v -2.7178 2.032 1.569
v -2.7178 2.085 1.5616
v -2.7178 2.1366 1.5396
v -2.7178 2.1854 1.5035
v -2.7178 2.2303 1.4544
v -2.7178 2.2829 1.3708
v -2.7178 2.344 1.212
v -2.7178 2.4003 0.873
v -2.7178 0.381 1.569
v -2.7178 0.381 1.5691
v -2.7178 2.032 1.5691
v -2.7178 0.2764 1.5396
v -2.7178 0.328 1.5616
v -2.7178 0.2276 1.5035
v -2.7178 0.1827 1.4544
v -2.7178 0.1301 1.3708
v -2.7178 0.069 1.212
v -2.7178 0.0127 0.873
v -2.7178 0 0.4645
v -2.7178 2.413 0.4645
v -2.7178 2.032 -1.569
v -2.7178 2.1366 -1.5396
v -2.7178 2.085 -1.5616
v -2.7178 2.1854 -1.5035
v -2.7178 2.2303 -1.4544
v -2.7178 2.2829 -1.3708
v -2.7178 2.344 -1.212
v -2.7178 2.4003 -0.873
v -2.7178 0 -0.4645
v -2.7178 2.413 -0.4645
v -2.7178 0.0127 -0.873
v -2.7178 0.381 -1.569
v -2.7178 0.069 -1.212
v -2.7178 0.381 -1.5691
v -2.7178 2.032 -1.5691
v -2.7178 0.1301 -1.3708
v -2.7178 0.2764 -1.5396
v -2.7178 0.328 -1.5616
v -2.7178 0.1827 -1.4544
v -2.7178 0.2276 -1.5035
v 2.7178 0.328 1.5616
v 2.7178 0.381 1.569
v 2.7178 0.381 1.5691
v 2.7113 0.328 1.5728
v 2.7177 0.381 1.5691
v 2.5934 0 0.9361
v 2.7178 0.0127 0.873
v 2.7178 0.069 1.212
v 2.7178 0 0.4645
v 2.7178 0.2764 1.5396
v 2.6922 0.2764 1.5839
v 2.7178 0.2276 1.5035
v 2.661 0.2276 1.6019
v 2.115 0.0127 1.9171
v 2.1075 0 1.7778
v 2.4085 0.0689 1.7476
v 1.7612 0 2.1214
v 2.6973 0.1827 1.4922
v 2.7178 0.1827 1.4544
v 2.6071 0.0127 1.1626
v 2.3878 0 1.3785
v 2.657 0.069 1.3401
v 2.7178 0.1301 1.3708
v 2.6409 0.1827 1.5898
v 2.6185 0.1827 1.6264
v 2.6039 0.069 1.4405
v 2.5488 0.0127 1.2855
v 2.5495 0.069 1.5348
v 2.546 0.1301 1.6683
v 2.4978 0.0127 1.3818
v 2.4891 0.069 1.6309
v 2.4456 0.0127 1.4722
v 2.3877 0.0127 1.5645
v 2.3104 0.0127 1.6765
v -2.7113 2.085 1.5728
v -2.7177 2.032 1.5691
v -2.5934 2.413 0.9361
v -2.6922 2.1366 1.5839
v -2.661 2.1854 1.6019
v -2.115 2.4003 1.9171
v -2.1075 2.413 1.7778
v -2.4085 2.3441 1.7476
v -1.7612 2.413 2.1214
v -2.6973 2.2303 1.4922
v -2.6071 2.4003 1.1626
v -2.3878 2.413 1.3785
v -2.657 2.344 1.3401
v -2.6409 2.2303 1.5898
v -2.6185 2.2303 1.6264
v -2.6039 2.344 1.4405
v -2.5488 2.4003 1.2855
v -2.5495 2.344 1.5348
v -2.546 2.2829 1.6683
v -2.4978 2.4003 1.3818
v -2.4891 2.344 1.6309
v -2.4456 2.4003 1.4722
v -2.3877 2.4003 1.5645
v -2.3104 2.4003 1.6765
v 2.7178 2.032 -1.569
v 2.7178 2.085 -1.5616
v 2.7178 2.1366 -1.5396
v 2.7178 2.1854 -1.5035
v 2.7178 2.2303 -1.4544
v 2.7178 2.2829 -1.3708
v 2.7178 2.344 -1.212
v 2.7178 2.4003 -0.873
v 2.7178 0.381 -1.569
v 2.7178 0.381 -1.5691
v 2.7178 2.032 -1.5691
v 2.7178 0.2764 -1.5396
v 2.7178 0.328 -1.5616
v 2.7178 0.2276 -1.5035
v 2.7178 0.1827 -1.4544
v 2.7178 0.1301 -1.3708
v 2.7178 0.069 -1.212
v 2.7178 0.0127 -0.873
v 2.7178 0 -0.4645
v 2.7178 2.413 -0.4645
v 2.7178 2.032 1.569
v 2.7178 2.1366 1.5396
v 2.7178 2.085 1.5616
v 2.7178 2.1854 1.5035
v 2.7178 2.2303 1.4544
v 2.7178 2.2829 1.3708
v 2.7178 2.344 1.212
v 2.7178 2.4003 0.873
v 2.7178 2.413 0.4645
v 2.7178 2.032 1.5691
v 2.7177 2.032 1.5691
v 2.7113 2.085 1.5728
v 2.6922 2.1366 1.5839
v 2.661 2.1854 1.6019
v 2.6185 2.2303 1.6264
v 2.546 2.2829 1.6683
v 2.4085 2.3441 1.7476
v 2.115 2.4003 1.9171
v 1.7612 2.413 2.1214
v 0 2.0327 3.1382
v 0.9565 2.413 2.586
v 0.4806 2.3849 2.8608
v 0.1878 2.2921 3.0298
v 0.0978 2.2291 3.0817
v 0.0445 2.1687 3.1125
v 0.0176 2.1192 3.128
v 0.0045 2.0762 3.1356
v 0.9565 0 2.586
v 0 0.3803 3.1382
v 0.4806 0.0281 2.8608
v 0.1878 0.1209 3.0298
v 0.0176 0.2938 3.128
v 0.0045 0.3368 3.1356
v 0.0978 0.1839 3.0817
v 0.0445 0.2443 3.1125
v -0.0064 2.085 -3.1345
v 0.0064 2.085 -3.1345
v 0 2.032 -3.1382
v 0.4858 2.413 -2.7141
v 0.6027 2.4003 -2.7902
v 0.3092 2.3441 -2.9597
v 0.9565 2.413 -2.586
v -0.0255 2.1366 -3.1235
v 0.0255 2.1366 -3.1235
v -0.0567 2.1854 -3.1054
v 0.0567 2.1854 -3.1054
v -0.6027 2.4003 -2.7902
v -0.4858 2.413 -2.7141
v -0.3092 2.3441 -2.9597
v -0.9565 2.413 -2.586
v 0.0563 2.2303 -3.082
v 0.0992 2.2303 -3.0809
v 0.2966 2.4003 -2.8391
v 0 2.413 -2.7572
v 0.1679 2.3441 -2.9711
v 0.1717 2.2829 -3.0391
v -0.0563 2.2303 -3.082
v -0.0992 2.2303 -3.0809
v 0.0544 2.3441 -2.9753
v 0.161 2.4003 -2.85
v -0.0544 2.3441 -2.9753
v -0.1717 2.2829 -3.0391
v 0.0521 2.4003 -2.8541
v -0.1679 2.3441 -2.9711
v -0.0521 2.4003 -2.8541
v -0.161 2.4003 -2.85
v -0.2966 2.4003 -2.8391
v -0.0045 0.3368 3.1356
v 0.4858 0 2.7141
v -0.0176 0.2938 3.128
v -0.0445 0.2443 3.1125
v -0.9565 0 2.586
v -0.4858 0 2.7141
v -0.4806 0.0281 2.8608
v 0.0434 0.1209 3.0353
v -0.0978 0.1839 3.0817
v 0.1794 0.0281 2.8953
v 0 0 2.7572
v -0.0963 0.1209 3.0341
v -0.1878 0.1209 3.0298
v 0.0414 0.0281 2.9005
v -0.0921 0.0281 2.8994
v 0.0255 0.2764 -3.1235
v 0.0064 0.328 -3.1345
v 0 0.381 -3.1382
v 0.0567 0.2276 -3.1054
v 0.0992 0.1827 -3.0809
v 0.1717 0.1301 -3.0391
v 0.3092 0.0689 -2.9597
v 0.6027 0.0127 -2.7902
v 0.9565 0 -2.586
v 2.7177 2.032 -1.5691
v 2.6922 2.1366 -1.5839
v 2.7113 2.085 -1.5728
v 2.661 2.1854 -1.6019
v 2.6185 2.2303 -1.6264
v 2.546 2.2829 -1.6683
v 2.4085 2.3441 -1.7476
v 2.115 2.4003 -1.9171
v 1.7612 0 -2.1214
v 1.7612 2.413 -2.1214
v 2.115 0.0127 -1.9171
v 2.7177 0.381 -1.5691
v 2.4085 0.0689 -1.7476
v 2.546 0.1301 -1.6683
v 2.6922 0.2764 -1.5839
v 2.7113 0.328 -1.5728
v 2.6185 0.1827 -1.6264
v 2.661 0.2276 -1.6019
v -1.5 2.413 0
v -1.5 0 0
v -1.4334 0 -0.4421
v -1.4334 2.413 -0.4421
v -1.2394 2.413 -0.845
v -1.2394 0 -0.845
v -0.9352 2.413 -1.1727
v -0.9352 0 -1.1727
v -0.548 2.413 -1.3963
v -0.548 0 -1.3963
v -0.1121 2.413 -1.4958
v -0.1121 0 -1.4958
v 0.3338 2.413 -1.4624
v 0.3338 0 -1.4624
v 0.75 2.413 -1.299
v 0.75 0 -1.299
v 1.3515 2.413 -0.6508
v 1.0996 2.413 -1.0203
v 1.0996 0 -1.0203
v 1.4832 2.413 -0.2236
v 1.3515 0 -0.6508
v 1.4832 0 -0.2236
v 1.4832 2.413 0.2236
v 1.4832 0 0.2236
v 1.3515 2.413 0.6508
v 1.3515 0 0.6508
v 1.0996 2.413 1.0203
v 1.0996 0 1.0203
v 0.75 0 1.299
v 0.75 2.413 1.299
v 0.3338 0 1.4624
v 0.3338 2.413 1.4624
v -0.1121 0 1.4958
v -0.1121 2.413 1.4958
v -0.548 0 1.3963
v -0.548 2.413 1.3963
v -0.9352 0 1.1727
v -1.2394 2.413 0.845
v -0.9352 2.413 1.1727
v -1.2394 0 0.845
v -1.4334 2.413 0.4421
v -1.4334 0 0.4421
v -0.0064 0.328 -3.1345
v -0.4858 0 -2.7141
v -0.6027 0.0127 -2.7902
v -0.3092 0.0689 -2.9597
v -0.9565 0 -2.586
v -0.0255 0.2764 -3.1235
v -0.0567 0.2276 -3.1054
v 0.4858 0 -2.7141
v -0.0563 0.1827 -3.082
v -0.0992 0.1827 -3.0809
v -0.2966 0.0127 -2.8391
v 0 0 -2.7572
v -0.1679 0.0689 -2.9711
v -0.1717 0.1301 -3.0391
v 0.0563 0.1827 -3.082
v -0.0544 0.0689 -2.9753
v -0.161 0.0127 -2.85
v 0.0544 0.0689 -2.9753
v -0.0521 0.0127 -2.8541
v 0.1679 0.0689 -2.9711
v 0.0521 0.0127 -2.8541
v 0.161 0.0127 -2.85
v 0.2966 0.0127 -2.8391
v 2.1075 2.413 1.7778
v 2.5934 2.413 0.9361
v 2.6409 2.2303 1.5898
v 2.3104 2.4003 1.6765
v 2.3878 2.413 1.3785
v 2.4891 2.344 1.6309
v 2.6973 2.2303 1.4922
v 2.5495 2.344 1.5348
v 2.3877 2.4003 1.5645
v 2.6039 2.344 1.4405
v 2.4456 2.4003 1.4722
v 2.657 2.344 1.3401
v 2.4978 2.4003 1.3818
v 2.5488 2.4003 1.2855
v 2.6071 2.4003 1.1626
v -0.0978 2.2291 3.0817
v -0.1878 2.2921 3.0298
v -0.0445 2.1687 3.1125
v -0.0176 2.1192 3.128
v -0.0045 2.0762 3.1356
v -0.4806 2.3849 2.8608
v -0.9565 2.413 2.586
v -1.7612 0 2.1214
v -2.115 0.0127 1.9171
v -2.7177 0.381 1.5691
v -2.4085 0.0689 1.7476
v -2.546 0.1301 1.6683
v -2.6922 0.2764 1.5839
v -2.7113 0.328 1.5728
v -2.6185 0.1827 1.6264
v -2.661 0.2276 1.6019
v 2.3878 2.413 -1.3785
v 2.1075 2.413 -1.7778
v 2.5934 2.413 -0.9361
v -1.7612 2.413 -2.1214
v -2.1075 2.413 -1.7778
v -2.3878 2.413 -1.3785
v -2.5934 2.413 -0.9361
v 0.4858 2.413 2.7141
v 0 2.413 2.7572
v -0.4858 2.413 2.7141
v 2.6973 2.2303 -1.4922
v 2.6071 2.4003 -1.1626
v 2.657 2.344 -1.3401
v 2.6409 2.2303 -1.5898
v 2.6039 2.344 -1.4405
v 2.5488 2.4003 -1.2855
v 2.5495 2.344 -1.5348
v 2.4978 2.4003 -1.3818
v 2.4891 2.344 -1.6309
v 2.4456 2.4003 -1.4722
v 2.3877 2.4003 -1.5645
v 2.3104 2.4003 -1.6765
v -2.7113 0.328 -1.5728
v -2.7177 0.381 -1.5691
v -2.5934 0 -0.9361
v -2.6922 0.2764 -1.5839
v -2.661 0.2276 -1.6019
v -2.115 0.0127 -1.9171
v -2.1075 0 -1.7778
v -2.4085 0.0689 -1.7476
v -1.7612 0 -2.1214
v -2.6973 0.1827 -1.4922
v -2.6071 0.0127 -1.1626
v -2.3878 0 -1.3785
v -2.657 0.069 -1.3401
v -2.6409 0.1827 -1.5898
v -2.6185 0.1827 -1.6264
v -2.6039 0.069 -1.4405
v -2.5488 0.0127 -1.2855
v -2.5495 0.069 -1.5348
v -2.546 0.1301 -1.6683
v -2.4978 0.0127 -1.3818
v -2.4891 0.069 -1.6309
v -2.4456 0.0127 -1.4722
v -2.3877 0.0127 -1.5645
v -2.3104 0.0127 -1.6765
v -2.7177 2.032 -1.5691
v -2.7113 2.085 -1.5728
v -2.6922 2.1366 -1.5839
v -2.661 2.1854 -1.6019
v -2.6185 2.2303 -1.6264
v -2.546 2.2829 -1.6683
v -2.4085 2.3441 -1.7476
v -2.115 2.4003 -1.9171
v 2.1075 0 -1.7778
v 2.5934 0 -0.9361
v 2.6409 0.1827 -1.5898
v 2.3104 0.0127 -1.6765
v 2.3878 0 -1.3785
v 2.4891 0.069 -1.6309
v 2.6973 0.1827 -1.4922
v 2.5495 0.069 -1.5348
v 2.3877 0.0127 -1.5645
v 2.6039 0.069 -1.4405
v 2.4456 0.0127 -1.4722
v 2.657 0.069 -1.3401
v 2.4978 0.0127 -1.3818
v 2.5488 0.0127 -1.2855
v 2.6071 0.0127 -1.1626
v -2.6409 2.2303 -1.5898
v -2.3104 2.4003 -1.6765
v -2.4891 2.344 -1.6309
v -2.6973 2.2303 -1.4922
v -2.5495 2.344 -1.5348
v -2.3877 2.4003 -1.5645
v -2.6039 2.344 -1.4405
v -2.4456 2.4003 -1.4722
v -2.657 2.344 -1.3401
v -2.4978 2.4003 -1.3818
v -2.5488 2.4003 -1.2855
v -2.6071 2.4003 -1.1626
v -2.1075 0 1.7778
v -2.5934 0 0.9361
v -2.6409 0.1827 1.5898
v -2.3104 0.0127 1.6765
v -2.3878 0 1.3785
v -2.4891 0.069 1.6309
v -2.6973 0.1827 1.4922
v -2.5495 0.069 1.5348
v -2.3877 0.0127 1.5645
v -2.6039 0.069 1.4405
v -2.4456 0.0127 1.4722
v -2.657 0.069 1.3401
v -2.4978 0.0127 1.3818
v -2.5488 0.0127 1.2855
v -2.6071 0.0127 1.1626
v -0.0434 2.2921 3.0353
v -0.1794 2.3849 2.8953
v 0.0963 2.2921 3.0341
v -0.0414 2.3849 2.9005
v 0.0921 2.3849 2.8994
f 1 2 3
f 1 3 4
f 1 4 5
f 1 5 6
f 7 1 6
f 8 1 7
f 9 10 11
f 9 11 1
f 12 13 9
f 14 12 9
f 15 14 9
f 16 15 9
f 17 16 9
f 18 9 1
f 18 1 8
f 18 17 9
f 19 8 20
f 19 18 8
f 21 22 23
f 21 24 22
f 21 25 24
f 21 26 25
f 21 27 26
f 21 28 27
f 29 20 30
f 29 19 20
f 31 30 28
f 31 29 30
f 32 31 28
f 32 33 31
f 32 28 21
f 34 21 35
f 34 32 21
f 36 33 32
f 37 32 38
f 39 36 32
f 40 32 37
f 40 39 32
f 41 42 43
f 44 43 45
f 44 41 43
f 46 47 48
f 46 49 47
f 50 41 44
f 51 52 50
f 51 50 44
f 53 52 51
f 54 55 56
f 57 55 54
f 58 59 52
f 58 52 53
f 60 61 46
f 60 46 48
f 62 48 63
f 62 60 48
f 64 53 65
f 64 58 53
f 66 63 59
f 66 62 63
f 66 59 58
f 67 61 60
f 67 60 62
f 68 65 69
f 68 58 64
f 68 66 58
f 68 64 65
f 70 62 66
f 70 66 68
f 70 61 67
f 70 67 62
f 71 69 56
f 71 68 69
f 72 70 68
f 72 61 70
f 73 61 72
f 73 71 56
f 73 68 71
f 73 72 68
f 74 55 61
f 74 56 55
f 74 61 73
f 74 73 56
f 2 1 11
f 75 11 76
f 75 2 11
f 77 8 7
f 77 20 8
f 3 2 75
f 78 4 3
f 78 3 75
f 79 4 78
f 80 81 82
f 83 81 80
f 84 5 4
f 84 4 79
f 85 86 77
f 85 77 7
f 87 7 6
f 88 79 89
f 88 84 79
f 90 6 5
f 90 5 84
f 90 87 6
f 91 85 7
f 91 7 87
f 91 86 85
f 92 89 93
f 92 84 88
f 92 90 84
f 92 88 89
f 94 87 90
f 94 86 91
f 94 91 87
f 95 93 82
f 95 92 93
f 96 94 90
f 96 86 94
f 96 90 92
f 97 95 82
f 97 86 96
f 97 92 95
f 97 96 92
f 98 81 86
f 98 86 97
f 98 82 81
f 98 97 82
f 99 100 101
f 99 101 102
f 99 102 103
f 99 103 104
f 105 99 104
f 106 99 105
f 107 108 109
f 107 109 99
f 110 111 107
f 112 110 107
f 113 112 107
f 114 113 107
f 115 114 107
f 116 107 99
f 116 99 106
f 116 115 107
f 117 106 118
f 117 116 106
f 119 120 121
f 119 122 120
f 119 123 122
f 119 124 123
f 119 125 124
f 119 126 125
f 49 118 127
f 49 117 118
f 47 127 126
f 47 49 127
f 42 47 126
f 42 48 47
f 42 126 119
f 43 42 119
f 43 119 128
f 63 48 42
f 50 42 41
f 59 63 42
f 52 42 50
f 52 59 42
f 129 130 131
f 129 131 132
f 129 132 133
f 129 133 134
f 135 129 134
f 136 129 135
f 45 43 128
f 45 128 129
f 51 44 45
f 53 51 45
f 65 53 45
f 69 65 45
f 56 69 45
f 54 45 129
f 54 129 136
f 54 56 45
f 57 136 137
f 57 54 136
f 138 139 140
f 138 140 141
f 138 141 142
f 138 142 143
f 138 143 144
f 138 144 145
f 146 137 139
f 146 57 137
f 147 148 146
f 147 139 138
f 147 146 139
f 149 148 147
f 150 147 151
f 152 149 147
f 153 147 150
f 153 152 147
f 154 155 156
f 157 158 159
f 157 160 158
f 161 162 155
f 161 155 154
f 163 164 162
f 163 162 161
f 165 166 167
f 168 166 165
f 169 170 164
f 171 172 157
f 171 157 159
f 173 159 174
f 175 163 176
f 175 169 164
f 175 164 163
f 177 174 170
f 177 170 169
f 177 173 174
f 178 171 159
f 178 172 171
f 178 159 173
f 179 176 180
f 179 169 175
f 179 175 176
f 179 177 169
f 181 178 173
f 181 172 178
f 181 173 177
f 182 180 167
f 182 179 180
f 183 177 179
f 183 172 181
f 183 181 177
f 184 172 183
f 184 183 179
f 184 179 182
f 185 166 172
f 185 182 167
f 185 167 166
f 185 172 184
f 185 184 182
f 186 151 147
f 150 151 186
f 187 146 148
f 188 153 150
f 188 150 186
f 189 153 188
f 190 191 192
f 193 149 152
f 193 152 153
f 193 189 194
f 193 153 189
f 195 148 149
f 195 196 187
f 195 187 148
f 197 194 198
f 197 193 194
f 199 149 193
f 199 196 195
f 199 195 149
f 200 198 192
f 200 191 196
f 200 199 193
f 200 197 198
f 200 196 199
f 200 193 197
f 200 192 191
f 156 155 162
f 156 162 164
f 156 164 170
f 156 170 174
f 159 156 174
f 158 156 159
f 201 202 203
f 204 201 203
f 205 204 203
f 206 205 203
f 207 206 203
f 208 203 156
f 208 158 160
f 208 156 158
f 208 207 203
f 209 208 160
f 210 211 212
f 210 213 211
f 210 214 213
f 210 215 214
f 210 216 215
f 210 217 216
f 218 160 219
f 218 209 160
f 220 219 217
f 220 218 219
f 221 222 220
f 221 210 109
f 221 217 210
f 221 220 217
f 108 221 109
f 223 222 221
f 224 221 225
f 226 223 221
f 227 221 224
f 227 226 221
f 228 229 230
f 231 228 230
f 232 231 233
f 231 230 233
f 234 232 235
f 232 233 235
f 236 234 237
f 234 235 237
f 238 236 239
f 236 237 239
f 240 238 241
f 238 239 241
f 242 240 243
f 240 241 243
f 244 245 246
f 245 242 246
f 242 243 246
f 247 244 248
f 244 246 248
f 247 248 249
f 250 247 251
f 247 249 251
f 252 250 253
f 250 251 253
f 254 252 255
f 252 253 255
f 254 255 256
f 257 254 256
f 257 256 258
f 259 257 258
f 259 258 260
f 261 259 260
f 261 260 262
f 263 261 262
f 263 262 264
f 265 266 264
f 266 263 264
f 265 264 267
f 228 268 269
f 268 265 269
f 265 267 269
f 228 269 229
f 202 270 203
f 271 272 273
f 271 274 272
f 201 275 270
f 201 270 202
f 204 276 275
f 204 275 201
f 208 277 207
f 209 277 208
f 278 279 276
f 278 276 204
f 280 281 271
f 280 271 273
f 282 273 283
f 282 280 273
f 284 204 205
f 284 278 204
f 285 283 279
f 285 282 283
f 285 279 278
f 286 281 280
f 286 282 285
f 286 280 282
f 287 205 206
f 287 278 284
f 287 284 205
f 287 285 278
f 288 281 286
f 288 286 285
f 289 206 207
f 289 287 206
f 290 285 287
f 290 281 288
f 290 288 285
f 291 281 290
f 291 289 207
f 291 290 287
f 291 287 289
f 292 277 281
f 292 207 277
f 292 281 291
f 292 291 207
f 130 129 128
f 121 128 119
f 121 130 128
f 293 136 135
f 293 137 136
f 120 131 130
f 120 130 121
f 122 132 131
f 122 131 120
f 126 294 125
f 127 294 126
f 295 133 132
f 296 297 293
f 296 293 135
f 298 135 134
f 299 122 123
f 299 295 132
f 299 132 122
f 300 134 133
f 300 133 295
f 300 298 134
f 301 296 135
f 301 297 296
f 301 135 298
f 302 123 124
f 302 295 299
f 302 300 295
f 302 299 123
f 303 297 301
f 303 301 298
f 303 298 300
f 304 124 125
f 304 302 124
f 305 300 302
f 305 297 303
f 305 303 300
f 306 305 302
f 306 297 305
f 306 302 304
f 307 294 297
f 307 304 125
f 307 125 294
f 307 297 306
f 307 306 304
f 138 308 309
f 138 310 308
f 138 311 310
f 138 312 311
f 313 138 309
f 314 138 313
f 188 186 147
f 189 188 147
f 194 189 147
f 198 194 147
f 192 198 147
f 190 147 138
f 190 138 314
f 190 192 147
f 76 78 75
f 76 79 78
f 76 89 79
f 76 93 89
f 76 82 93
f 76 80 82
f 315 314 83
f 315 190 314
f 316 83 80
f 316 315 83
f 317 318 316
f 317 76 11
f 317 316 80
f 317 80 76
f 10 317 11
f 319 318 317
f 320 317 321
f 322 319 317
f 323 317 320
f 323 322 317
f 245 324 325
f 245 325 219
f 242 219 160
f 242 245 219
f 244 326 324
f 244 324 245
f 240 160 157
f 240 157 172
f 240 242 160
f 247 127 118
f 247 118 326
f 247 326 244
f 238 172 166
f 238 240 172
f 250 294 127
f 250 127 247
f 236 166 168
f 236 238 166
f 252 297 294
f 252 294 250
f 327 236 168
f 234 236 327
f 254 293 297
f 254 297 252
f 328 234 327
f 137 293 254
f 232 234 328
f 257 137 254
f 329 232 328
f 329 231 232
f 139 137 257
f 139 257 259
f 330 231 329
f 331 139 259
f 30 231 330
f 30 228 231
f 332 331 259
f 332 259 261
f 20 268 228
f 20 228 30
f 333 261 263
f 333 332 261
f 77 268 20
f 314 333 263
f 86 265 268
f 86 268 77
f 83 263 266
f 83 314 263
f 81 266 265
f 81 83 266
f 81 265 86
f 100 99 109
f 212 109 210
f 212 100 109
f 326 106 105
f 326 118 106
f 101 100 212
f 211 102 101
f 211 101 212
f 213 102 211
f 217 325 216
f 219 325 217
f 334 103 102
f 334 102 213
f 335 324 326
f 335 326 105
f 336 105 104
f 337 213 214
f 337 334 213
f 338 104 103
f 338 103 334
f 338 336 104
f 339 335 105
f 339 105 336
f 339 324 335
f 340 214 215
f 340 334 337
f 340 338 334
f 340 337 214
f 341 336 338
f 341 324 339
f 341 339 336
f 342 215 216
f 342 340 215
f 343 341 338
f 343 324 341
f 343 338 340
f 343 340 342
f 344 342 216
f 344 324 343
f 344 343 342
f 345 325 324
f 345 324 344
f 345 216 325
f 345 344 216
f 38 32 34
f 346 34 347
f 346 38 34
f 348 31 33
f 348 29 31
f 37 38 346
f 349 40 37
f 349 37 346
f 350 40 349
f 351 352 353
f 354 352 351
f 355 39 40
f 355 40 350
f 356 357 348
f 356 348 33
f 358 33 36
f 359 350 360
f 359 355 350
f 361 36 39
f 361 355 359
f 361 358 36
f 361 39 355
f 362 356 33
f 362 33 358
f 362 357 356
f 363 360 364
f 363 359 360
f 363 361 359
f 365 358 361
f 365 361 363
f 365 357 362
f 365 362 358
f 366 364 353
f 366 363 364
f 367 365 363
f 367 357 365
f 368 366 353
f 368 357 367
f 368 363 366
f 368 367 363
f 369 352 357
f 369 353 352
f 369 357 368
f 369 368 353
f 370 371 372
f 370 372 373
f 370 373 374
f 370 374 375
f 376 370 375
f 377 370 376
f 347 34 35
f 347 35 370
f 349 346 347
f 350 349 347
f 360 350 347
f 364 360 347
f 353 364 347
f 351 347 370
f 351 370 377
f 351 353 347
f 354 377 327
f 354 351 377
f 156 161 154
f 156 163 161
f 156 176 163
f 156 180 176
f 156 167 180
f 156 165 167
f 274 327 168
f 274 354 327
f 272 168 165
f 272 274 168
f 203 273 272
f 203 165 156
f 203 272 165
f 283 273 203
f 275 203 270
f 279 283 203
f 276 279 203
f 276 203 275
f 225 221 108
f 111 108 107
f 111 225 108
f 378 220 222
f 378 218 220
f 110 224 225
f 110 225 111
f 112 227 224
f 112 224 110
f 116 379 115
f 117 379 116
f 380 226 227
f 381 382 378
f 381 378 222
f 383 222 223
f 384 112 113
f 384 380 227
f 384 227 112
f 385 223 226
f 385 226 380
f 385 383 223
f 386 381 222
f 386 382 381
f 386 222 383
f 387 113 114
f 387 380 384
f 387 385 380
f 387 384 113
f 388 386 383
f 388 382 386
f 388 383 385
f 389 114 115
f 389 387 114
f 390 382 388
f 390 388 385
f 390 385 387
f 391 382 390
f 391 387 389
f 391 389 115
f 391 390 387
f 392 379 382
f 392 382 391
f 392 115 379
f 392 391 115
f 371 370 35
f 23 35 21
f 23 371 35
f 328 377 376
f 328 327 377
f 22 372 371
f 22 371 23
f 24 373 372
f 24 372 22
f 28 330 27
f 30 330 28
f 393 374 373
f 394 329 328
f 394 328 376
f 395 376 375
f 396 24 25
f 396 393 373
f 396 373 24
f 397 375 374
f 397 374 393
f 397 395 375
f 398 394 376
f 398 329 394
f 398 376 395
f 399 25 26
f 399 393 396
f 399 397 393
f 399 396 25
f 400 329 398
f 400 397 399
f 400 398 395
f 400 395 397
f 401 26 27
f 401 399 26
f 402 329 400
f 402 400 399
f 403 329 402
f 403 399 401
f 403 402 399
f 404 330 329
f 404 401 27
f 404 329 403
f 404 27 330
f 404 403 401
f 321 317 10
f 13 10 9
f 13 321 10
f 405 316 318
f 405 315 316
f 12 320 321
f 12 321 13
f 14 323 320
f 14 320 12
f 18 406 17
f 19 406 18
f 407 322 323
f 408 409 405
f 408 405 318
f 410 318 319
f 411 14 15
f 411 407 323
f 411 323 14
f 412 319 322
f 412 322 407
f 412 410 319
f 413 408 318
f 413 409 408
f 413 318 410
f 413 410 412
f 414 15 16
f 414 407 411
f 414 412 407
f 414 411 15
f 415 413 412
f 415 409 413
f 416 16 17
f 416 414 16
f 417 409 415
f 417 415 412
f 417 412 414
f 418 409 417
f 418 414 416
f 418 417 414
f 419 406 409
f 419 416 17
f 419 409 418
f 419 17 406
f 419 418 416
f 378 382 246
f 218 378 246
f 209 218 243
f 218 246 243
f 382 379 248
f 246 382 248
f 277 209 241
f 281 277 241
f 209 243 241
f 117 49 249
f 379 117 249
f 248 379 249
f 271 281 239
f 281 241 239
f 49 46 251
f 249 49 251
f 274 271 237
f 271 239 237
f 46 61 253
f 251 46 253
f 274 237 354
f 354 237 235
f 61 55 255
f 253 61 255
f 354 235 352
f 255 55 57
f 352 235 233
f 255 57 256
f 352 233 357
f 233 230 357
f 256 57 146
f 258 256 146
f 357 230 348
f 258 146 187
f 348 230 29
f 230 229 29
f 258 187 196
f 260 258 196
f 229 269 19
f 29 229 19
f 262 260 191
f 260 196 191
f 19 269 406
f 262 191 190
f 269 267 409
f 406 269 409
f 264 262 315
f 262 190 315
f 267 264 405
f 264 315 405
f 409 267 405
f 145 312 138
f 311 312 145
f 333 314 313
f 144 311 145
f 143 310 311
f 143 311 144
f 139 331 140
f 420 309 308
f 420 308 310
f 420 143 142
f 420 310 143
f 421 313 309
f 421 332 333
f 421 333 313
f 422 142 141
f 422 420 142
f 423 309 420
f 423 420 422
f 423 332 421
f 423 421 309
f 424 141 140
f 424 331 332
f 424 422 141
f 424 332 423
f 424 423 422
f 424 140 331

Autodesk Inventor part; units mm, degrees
ref_plane "YZ Plane" through (0, 0, 0) normal (1, 0, 0) x (0, 1, 0)
ref_plane "XZ Plane" through (0, 0, 0) normal (0, 1, 0) x (-1, 0, 0)
sketch "Sketch1" plane through (0, 0, 0) normal (0, 1, 0) x (-1, 0, 0)
  line L0 (-2.7178, 1.5691) -> (0, 3.1382)
  line L1 (0, 3.1382) -> (2.7178, 1.5691)
  line L2 (2.7178, 1.5691) -> (2.7178, -1.5691)
  line L3 (2.7178, -1.5691) -> (0, -3.1382)
  line L4 (0, -3.1382) -> (-2.7178, -1.5691)
  line L5 (-2.7178, -1.5691) -> (-2.7178, 1.5691)
  circle A0 centre (0, 0) radius 1.5
  dimension "d1" = 3
extrude "Extrusion1" add sketch "Sketch1" along normal blind 2.413
thread "Thread1" size "M3x0.5" class "6H" standard "ANSI Metric M Profile" full length
sketch "Sketch3" plane through (0, 0, 0) normal (1, 0, 0) x (0, 1, 0)
  line L0 (0, 3.1382) -> (2.413, 3.1382) projected
  line L1 (0, 1.5691) -> (0, 3.1382) projected
  line L2 (0, 1.5691) -> (0, 2.7572)
  line L3 (0.381, 3.1382) -> (2.413, 3.1382)
  arc A0 (0.381, 3.1382) -> (0, 2.7572) centre (0.381, 2.7572) ccw
  line L4 (0, 2.7572) -> (-0.2163, 2.7572)
  line L5 (-0.2163, 2.7572) -> (-0.2163, 4.3172)
  line L6 (-0.2163, 4.3172) -> (0.381, 4.3172)
  line L7 (0.381, 4.3172) -> (0.381, 3.1382)
  line L8 (-0.7421, 0) -> (2.9389, 0) projected
  point P0 (0, 0)
  dimension "d8" = 0.381
ref_plane "Work Plane1" through (0, 1.2065, 3.1382) normal (0, 1, 0) x (0.866, 0, -0.5)
revolve "Revolution2" cut sketch "Sketch3" angle 360 about axis through (0, -10, 0) along (0, 1, 0)
mirror "Mirror1" about plane through (0, 1.2065, 3.1382) normal (0, 1, 0) of "Revolution2"
properties part number "M3 nut"
